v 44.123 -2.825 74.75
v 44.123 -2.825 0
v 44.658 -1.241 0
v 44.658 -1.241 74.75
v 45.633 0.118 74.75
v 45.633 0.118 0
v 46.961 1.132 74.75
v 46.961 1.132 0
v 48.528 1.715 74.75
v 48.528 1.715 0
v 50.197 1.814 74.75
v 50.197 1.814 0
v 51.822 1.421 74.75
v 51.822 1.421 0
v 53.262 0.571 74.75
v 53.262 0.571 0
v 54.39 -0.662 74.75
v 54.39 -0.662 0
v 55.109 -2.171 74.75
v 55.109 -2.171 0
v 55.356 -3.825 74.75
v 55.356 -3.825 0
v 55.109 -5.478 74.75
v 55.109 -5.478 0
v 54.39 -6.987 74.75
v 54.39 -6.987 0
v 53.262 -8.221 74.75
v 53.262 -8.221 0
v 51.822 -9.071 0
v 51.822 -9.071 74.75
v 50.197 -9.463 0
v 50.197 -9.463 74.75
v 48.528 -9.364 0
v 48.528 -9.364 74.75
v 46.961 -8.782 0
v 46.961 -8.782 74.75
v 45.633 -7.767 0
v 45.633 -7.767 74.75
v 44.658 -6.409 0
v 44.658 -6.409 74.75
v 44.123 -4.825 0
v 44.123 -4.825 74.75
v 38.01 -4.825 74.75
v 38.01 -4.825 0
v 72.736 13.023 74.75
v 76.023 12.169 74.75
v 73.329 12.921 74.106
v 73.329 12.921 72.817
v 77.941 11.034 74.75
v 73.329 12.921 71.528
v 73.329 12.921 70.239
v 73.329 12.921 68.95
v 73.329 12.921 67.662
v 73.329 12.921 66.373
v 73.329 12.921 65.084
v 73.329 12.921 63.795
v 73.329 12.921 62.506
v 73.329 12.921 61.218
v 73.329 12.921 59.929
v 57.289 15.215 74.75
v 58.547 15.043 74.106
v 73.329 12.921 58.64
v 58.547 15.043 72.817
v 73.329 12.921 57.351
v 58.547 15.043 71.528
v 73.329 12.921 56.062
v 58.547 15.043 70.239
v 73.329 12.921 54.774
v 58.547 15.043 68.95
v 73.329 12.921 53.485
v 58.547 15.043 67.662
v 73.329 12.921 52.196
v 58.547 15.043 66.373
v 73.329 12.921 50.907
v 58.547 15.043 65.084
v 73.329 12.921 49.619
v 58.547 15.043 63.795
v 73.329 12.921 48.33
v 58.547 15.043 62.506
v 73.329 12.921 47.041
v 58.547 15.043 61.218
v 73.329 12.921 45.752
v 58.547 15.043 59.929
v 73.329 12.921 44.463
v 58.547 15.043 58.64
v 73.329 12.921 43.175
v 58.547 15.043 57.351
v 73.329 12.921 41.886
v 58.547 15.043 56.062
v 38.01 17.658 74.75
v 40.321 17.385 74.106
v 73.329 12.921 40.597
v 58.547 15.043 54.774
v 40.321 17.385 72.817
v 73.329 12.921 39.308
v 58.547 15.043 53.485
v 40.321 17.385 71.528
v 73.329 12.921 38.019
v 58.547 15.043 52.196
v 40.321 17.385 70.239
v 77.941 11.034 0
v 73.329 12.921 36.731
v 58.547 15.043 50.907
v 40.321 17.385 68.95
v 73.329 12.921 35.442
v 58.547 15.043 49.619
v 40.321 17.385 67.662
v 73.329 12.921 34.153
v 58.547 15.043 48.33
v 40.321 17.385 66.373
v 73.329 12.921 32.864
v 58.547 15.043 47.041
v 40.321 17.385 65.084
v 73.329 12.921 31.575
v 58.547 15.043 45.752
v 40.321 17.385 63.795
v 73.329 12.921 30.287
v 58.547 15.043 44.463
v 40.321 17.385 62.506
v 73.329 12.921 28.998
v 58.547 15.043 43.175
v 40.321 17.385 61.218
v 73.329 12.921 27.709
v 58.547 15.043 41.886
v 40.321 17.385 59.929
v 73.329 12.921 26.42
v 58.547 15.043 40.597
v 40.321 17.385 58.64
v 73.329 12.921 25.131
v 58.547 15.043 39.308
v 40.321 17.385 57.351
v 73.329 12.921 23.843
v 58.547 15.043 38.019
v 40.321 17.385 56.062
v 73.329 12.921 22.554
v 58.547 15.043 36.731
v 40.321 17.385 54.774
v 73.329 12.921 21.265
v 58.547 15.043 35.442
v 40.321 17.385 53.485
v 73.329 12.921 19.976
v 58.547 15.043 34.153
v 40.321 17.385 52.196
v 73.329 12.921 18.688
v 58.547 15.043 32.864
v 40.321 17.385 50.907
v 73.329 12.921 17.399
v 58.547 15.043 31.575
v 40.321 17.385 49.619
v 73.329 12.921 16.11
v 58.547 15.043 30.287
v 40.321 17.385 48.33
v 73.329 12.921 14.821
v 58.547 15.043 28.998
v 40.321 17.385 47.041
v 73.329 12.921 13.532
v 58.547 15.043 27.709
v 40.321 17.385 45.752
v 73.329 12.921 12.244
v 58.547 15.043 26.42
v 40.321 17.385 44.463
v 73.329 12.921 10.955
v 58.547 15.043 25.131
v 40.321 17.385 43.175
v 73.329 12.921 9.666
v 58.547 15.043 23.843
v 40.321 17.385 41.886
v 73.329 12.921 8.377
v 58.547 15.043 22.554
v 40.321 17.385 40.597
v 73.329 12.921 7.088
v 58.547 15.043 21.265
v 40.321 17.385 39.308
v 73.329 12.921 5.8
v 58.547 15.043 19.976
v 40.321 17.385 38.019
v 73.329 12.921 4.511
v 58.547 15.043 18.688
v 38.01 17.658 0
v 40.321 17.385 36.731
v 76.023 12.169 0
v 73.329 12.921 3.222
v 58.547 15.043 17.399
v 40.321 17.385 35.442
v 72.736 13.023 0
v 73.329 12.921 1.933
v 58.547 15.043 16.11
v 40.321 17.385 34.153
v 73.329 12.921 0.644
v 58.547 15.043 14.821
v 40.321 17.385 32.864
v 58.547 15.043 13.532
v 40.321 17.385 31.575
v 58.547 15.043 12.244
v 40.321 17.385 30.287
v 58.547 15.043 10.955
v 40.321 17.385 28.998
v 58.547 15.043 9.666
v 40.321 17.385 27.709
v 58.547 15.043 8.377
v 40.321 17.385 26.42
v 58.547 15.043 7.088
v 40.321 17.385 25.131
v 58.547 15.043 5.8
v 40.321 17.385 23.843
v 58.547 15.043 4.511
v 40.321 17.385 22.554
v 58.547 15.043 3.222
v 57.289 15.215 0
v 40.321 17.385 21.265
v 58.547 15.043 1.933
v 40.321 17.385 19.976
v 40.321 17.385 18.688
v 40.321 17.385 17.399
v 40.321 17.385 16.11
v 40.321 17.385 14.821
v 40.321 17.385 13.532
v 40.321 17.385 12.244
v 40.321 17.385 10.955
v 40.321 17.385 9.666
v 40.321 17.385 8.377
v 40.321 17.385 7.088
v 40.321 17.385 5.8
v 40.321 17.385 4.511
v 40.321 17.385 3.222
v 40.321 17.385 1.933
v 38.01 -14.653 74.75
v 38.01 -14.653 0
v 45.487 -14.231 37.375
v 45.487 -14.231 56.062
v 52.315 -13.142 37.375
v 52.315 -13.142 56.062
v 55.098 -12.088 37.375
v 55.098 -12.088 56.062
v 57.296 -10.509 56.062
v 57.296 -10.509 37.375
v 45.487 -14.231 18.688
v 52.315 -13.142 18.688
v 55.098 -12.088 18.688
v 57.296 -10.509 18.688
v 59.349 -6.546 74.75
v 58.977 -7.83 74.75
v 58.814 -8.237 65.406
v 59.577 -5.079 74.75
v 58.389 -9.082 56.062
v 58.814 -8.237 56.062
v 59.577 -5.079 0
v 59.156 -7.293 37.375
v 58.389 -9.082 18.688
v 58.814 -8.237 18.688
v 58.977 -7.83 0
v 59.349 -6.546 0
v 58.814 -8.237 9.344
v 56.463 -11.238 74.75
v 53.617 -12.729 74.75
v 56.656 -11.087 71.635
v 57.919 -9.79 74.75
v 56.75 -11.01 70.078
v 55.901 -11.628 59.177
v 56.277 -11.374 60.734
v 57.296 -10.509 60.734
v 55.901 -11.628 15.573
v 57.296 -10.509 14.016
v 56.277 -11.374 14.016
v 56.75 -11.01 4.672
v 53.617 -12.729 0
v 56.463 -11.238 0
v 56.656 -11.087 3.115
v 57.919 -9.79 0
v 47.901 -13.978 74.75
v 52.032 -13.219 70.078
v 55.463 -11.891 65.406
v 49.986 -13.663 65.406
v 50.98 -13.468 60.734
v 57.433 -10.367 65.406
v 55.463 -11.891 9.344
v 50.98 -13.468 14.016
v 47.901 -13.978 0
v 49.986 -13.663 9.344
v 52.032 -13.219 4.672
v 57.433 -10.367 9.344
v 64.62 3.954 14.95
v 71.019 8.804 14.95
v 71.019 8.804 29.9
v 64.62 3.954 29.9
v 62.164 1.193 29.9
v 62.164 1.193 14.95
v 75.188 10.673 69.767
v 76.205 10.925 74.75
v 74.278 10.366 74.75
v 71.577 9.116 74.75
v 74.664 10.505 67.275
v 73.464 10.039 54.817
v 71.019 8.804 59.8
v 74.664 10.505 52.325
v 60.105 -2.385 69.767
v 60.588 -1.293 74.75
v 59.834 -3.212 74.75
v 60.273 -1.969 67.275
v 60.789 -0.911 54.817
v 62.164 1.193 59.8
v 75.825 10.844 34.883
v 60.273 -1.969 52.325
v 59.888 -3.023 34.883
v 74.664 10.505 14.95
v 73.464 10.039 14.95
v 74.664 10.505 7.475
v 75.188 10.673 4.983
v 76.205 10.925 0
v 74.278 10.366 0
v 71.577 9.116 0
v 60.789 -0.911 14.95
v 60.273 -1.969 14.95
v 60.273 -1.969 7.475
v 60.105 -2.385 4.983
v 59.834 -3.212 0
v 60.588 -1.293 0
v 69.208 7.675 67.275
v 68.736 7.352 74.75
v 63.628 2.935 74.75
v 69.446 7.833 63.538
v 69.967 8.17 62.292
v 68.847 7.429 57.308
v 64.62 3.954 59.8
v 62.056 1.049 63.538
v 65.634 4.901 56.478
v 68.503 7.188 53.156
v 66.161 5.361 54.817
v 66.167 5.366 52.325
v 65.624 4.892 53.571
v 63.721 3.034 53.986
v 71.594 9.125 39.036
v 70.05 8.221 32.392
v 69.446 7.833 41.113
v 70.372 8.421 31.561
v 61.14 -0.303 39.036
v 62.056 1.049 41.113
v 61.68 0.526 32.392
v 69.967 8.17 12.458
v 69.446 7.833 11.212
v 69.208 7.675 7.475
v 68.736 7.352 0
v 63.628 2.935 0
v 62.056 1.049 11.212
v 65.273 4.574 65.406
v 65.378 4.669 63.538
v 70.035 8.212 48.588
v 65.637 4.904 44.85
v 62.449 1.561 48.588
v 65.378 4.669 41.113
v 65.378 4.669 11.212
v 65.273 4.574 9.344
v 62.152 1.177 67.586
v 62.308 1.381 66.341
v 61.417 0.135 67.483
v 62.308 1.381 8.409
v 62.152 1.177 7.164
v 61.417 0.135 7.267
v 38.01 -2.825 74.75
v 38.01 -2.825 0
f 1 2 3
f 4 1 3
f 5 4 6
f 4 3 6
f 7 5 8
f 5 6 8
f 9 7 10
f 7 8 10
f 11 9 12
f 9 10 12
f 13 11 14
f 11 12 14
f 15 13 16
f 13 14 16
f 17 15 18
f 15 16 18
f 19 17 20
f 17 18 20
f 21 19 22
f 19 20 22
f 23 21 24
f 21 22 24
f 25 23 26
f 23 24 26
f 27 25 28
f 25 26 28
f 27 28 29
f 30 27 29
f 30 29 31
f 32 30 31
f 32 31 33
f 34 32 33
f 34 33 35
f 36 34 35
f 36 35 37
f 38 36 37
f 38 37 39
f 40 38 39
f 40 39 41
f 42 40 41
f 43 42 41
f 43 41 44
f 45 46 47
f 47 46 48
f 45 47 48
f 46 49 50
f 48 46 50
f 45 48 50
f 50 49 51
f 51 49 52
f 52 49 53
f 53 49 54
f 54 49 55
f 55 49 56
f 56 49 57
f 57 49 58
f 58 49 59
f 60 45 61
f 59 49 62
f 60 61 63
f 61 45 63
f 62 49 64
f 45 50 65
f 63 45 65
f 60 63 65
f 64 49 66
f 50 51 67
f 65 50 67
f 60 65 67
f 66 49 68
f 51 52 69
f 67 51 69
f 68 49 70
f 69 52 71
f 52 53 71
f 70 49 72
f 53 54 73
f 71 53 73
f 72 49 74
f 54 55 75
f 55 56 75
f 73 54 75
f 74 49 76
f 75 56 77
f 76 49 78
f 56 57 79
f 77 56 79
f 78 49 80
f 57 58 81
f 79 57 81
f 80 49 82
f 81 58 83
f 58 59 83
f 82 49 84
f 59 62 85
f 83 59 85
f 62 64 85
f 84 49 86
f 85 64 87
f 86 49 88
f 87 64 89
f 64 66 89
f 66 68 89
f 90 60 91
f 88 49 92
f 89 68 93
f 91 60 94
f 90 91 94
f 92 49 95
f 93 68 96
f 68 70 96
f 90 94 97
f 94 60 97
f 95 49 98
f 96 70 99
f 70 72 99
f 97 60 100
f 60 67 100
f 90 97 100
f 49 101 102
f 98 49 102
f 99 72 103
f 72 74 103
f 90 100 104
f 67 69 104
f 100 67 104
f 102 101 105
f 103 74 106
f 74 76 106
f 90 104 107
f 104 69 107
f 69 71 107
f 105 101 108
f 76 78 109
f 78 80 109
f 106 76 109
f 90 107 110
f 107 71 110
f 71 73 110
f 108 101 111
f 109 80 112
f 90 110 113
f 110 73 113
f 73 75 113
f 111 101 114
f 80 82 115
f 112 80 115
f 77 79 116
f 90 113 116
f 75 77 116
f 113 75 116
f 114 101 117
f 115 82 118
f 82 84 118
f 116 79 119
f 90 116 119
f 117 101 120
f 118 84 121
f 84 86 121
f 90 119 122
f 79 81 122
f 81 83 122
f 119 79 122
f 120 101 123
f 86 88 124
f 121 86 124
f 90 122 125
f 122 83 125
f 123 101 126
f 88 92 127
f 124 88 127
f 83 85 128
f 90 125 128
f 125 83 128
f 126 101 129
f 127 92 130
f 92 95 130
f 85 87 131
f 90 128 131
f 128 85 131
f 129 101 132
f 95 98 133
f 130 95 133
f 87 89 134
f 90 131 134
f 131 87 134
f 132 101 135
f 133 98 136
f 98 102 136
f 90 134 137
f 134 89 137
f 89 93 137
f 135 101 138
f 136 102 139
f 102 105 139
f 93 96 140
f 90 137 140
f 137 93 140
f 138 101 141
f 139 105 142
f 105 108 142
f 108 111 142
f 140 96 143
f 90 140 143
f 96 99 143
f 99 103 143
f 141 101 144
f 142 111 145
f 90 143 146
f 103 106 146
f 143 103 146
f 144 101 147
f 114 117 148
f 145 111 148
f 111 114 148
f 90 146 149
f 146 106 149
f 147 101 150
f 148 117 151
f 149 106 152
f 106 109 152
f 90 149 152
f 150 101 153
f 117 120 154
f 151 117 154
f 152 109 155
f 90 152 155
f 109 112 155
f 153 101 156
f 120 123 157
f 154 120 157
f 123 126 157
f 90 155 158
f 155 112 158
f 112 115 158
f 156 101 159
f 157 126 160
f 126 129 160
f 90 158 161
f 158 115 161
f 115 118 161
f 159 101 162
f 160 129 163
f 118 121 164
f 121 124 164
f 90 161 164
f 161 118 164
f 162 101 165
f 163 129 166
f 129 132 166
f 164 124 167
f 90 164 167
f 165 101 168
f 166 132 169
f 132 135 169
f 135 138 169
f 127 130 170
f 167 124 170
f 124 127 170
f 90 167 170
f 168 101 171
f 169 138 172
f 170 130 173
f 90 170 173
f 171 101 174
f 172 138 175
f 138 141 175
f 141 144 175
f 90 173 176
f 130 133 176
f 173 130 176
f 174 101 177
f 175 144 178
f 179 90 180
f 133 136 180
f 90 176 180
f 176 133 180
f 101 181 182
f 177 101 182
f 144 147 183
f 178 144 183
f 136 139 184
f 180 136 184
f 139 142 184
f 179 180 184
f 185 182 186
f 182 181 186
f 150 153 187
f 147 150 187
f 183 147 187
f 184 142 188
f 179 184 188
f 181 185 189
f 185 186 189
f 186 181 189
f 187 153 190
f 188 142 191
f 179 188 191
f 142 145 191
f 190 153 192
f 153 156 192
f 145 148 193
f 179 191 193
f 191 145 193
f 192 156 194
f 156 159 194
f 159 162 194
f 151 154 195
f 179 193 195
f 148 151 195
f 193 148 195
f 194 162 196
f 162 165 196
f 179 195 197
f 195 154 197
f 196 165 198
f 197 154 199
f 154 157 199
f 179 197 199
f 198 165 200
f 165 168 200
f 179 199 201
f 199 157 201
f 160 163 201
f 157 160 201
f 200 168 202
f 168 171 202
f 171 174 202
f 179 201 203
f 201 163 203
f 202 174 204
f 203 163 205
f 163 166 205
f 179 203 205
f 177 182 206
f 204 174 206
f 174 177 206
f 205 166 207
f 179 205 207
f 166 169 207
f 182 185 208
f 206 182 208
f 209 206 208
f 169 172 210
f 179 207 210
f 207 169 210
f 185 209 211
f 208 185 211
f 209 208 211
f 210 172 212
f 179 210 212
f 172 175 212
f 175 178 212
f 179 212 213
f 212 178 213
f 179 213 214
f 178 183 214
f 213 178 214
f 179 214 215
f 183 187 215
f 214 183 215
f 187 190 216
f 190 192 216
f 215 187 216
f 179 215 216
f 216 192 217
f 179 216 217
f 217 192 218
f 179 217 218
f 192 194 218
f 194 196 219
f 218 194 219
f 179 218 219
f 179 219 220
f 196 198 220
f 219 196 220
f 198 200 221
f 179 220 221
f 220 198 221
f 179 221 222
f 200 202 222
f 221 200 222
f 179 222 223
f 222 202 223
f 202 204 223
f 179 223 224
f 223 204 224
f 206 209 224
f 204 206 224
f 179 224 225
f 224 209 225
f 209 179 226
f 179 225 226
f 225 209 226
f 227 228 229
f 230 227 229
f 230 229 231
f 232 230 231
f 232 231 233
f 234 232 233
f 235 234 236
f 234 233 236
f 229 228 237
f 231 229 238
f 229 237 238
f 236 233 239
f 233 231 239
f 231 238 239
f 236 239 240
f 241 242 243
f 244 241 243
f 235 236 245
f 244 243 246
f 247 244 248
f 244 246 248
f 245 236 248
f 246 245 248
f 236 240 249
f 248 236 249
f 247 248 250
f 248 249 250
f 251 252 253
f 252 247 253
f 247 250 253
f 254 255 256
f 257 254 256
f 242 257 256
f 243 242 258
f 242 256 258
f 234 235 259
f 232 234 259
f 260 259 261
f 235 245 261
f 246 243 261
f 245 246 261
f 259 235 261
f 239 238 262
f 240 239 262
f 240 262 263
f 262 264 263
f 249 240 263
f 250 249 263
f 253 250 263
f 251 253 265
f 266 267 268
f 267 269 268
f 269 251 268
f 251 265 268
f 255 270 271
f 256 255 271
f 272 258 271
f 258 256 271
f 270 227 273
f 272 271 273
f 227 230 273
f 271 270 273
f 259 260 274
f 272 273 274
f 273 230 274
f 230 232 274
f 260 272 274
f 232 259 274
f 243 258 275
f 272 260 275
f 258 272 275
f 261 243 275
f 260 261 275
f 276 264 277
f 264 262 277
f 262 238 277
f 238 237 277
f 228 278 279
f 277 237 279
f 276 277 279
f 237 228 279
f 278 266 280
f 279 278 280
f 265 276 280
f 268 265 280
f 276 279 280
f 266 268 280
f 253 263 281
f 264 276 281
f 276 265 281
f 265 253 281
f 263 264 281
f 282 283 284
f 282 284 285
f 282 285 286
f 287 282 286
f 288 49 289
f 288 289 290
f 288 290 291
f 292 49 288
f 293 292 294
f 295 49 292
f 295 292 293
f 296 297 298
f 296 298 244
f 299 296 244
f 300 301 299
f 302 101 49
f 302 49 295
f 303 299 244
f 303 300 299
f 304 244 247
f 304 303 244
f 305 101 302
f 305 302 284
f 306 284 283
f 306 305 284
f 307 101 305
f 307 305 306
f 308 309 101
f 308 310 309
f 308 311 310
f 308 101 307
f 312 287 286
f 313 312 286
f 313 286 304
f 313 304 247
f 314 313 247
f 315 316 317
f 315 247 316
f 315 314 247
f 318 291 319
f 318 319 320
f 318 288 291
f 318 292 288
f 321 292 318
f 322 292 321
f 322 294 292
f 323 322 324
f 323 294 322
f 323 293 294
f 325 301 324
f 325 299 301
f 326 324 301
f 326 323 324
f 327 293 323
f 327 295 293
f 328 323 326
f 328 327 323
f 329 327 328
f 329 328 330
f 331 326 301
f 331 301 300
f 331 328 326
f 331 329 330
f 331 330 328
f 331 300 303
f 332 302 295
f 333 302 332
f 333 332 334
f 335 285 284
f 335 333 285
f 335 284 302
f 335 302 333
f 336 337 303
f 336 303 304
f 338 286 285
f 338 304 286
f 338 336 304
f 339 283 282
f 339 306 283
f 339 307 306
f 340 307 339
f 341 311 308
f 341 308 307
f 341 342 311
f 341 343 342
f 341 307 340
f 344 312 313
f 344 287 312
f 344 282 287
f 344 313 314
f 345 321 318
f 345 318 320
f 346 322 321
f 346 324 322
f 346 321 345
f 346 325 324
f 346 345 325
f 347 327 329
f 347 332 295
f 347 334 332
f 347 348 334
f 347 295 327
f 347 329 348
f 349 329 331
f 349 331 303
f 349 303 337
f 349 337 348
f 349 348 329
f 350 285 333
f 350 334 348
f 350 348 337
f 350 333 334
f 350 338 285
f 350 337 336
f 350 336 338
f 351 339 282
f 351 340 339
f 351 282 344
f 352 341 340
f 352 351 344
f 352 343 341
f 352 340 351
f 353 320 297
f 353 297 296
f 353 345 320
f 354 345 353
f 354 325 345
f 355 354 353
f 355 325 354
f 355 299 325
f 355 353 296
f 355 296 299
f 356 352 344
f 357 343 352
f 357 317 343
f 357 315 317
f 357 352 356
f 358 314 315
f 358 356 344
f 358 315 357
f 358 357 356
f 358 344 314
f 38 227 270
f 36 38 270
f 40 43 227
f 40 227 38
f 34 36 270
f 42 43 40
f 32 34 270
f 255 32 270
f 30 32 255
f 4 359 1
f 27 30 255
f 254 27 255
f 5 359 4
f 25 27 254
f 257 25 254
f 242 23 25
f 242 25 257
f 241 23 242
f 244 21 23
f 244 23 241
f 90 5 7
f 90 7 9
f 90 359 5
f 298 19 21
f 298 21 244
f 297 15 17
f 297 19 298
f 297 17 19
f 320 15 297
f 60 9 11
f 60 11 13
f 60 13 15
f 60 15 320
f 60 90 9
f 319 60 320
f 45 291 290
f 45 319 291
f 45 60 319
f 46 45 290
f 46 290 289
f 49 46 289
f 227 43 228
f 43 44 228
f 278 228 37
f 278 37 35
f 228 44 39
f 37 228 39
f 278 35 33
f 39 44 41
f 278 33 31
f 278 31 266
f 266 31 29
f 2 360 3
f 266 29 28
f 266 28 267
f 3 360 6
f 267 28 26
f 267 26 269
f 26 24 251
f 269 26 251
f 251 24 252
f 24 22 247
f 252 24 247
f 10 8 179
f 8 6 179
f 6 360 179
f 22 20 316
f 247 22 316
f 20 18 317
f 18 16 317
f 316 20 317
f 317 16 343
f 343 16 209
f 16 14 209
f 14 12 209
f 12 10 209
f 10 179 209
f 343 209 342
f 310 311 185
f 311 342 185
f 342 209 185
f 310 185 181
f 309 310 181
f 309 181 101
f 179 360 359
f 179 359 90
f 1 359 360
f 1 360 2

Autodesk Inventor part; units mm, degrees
ref_plane "YZ Plane" through (0, 0, 0) normal (1, 0, 0) x (0, 1, 0)
ref_plane "XZ Plane" through (0, 0, 0) normal (0, 1, 0) x (-1, 0, 0)
ref_plane "XY Plane" through (0, 0, 0) normal (0, 0, 1) x (1, 0, 0)
sketch "Sketch3" plane through (0, 0, 0) normal (0, 0, 1) x (1, 0, 0)
  line L0 (-80.5781, 0.8246) -> (-80.5781, 20.7988) construction
  circle A0 centre (-80.5781, 0.8246) radius 13.481
  line L1 (-53.7179, 12.5571) -> (-53.7179, -10.9927)
  arc A1 (-53.7179, -10.9927) -> (-51.5054, -12.9814) centre (-51.7179, -10.9927) ccw
  arc A2 (-51.5054, 14.5458) -> (-53.7179, 12.5571) centre (-51.7179, 12.5571) ccw
  line L2 (36.2229, -3.6088) -> (-51.5054, -12.9814)
  line L3 (38.0104, 3.1845) -> (38.0104, -1.6201)
  line L4 (-80.5781, 0.8246) -> (49.5525, 0.8246) construction
  circle A3 centre (49.6953, -3.8247) radius 5.6609
  line L5 (59.6953, 14.884) -> (59.6953, -12.7998) construction
  spline S0 degree 4 poles (77.9414, 11.0338) (75.5683, 12.9654) (71.7145, 13.0272) (66.8099, 13.9036) (60.7685, 14.7338) (56.2959, 15.3578) (51.7728, 15.9509) (47.2242, 16.5426) (42.6244, 17.1111) (37.9974, 17.6651) (33.3378, 18.1987) (28.6546, 18.7114) (23.9504, 19.2026) (19.2309, 19.6699) (14.5002, 20.1135) (9.7632, 20.5291) (5.025, 20.9191) (0.2903, 21.2792) (-4.4372, 21.6095) (-9.151, 21.9092) (-13.8524, 22.1766) (-18.5268, 22.4102) (-23.2002, 22.6105) (-27.8558, 22.7627) (-32.4748, 22.8704) (-37.0553, 22.9312) (-41.5904, 22.9454) (-46.0738, 22.9127) (-50.5027, 22.8323) (-54.8678, 22.7052) (-59.1755, 22.5324) (-63.394, 22.3084) (-67.5752, 22.0492) (-71.5451, 21.7209) (-75.7777, 21.4072) (-79.04, 20.9063) (-83.4863, 20.5541) (-87.0067, 20.037) (-90.7113, 19.5168) (-94.2172, 18.9459) (-97.6363, 18.3426) (-100.9342, 17.7015) (-104.1216, 17.0263) (-107.1909, 16.3187) (-110.1396, 15.5797) (-112.9656, 14.8117) (-115.6652, 14.0172) (-118.2357, 13.1965) (-120.6759, 12.3541) (-122.9817, 11.4895) (-125.1529, 10.6071) (-127.1857, 9.7065) (-129.0794, 8.7914) (-130.8324, 7.8633) (-132.4429, 6.923) (-133.9096, 5.9737) (-135.2322, 5.016) (-136.4083, 4.0508) (-137.4392, 3.0816) (-138.3215, 2.1025) (-139.0592, 1.1321) (-139.6407, 0.1249) (-140.106, -0.8362) (-140.3589, -2.0477) (-140.602, -2.598) (-140.1166, -5.4607) (-140.0539, -5.4622) (-139.4639, -6.7645) (-138.8842, -7.4979) (-138.1173, -8.3934) (-137.2199, -9.1877) (-136.1721, -9.9852) (-134.9893, -10.738) (-133.6669, -11.4655) (-132.2091, -12.1599) (-130.6156, -12.8245) (-128.8897, -13.4579) (-127.0312, -14.0591) (-125.0439, -14.6296) (-122.9287, -15.1678) (-120.6879, -15.6738) (-118.3241, -16.1476) (-115.8396, -16.5892) (-113.2366, -16.9984) (-110.5176, -17.3742) (-107.6861, -17.7183) (-104.7439, -18.0297) (-101.6943, -18.3095) (-98.5398, -18.5568) (-95.2843, -18.7732) (-91.9297, -18.9579) (-88.48, -19.1131) (-84.9381, -19.2376) (-81.3071, -19.3341) (-77.5906, -19.4015) (-73.7915, -19.4421) (-69.9139, -19.4561) (-65.961, -19.445) (-61.9362, -19.4102) (-57.8434, -19.3518) (-53.6861, -19.2727) (-49.4679, -19.1731) (-45.1932, -19.0538) (-40.8649, -18.9183) (-36.4879, -18.766) (-32.0649, -18.5992) (-27.598, -18.4192) (-23.0941, -18.227) (-18.5434, -18.0273) (-13.9382, -17.8076) (-9.3141, -17.5719) (-4.666, -17.3195) (-0.0002, -17.052) (4.6675, -16.7728) (9.3655, -16.4759) (14.0236, -16.1832) (19.545, -15.7815) (23.3079, -15.6072) (27.1098, -15.1781) (28.8959, -15.0599) knots 0 0 0 0 0 0.024672 0.034555 0.0445 0.054495 0.064543 0.074632 0.084755 0.094911 0.105094 0.115299 0.125521 0.135755 0.145995 0.156237 0.166475 0.176705 0.186921 0.197118 0.207299 0.217463 0.227605 0.23772 0.247796 0.257824 0.267798 0.277713 0.287563 0.297345 0.307053 0.31668 0.326224 0.335555 0.344908 0.354162 0.363308 0.372467 0.381393 0.390196 0.398872 0.407415 0.41582 0.424082 0.432193 0.44015 0.447945 0.455574 0.46303 0.470307 0.477401 0.484305 0.491015 0.497525 0.503831 0.509931 0.515822 0.521506 0.526986 0.53227 0.537373 0.542316 0.547131 0.552525 0.557529 0.562533 0.567581 0.57205 0.576988 0.582082 0.587354 0.592817 0.598478 0.604341 0.610406 0.616671 0.623133 0.629789 0.636632 0.643658 0.650861 0.658236 0.665777 0.673478 0.681333 0.689338 0.697486 0.705771 0.71419 0.722736 0.731403 0.740188 0.749084 0.758087 0.767192 0.776393 0.785687 0.795067 0.804529 0.814069 0.823682 0.833362 0.843106 0.852907 0.862763 0.872667 0.88262 0.892624 0.902675 0.912766 0.92289 0.933033 0.943191 0.953358 0.963531 0.973703 0.984092 1 1 1 1 1
  line L6 (7.5013, -16.4763) -> (50.2906, -13.6435) construction
  arc A4 (44.8353, -17.2546) -> (13.385, -19.3367) centre (31.5327, -54.8885) ccw construction
  line L7 (159.6953, -3.8066) -> (59.6953, -3.8066) construction
  line L8 (-51.5054, 14.5458) -> (36.2229, 5.1732)
  arc A5 (36.2229, -3.6088) -> (38.0104, -1.6201) centre (36.0104, -1.6201) ccw
  arc A6 (38.0104, 3.1845) -> (36.2229, 5.1732) centre (36.0104, 3.1845) ccw
  spline S1 degree 4 poles (78.1029, 11.0141) (76.6463, 11.2227) (73.9909, 10.5042) (70.2765, 8.6041) (66.0429, 5.3938) (62.3889, 1.8499) (60.314, -1.2467) (59.5572, -3.5763) (59.5773, -5.0793) knots 0 0 0 0 0 0.302475 0.43895 0.576633 0.708802 1 1 1 1 1
  spline S2 degree 4 poles (28.8959, -15.0599) (34.0984, -14.7105) (49.269, -14.182) (58.5645, -15.239) (59.5773, -5.0793) knots 0 0 0 0 0 1 1 1 1 1
  line L9 (28.8959, -15.0599) -> (34.0984, -14.7105) construction
  line L10 (34.0984, -14.7105) -> (49.269, -14.182) construction
  line L11 (49.269, -14.182) -> (58.5645, -15.239) construction
  line L12 (58.5645, -15.239) -> (59.5773, -5.0793) construction
  line L13 (-140.4646, -2.8394) -> (159.4818, -3.8173) construction
  line L14 (-132.0856, 0.6333) -> (-132.0856, -6.3667)
  line L15 (-132.0856, -6.3667) -> (-110.3816, -12.3574)
  line L16 (-110.3816, -12.3574) -> (-104.797, -12.3574)
  line L17 (-104.797, -12.3574) -> (-104.797, -18.0156)
  line L18 (-132.0856, 0.6333) -> (-110.3816, 10.553)
  line L19 (-110.3816, 10.553) -> (-104.1736, 10.553)
  line L20 (-104.1736, 10.553) -> (-104.1736, 17.0026)
  line L21 (38.0104, 0.8246) -> (38.0104, -14.6534)
  line L22 (38.0104, 0.8246) -> (38.0104, 17.6585)
  point P0 (0, 0)
  point P1 (17.6589, 23.5628)
  point P2 (75.883, 10.8572)
  point P3 (72.8647, 9.7686)
  point P4 (69.4179, 7.8149)
  point P5 (66.0452, 5.2617)
  point P6 (63.1887, 2.4463)
  point P7 (61.1228, -0.3317)
  point P8 (59.9357, -2.8689)
  point P9 (-160.0931, -3.8671)
  point P10 (28.8959, -15.0599)
  point P11 (69.5533, 13.4647)
  point P12 (65.1899, 14.1023)
  point P13 (60.7936, 14.7318)
  point P14 (56.3207, 15.3468)
  point P15 (51.7945, 15.947)
  point P16 (47.2398, 16.5346)
  point P17 (42.6414, 17.1053)
  point P18 (33.3491, 18.1925)
  point P19 (28.6632, 18.7055)
  point P20 (23.9568, 19.1966)
  point P21 (19.2348, 19.6643)
  point P22 (14.5017, 20.1074)
  point P23 (9.7623, 20.5238)
  point P24 (5.0217, 20.9132)
  point P25 (0.2844, 21.2735)
  point P26 (-4.4451, 21.6038)
  point P27 (-9.1614, 21.9032)
  point P28 (-13.86, 22.1702)
  point P29 (-18.5361, 22.4036)
  point P30 (-23.211, 22.601)
  point P31 (-27.8721, 22.754)
  point P32 (-32.4966, 22.8611)
  point P33 (-37.0797, 22.9217)
  point P34 (-41.6169, 22.9356)
  point P35 (-46.1028, 22.9023)
  point P36 (-50.5329, 22.8216)
  point P37 (-54.9021, 22.6941)
  point P38 (-59.2065, 22.5195)
  point P39 (-63.4406, 22.2977)
  point P40 (-67.6008, 22.0302)
  point P41 (-71.6806, 21.7165)
  point P42 (-75.6814, 21.3591)
  point P43 (-79.1834, 20.9458)
  point P44 (-83.4048, 20.5095)
  point P45 (-87.1309, 20.023)
  point P46 (-90.7527, 19.494)
  point P47 (-94.2725, 18.9266)
  point P48 (-97.6845, 18.3211)
  point P49 (-100.9861, 17.6791)
  point P50 (-107.2438, 16.2934)
  point P51 (-110.1931, 15.553)
  point P52 (-113.0194, 14.7835)
  point P53 (-115.7191, 13.987)
  point P54 (-118.2898, 13.165)
  point P55 (-120.7294, 12.3201)
  point P56 (-123.0349, 11.454)
  point P57 (-125.2048, 10.569)
  point P58 (-127.2364, 9.6666)
  point P59 (-129.1282, 8.7491)
  point P60 (-130.8786, 7.8185)
  point P61 (-132.486, 6.8762)
  point P62 (-133.9488, 5.9245)
  point P63 (-135.2661, 4.9648)
  point P64 (-136.4363, 3.9987)
  point P65 (-137.4592, 3.0275)
  point P66 (-138.3336, 2.0531)
  point P67 (-139.0591, 1.0763)
  point P68 (-139.6352, 0.0983)
  point P69 (-140.0613, -0.8802)
  point P70 (-140.338, -1.8576)
  point P71 (-140.1239, -5.2398)
  point P72 (-139.9547, -5.7022)
  point P73 (-139.492, -6.6066)
  point P74 (-138.8844, -7.4823)
  point P75 (-138.1328, -8.3292)
  point P76 (-137.2384, -9.147)
  point P77 (-136.202, -9.9355)
  point P78 (-135.0249, -10.6943)
  point P79 (-133.7085, -11.4228)
  point P80 (-132.2548, -12.1206)
  point P81 (-130.6648, -12.7879)
  point P82 (-128.941, -13.4239)
  point P83 (-127.0846, -14.0282)
  point P84 (-125.0983, -14.6009)
  point P85 (-122.9839, -15.1415)
  point P86 (-120.7435, -15.6497)
  point P87 (-118.3798, -16.1256)
  point P88 (-115.8952, -16.569)
  point P89 (-113.2918, -16.9797)
  point P90 (-110.5723, -17.3574)
  point P91 (-107.74, -17.7027)
  point P92 (-101.7463, -18.2964)
  point P93 (-98.5909, -18.5451)
  point P94 (-95.3341, -18.7623)
  point P95 (-91.9783, -18.9484)
  point P96 (-88.5271, -19.1041)
  point P97 (-84.9838, -19.2298)
  point P98 (-81.3514, -19.3267)
  point P99 (-77.6332, -19.3951)
  point P100 (-73.8324, -19.4362)
  point P101 (-69.9531, -19.4509)
  point P102 (-65.9985, -19.4404)
  point P103 (-61.9719, -19.4059)
  point P104 (-57.8772, -19.3483)
  point P105 (-53.718, -19.2694)
  point P106 (-49.4979, -19.1701)
  point P107 (-45.2211, -19.0516)
  point P108 (-40.8909, -18.916)
  point P109 (-36.5118, -18.7642)
  point P110 (-32.0871, -18.5977)
  point P111 (-27.6213, -18.418)
  point P112 (-23.1183, -18.2269)
  point P113 (-18.5646, -18.0247)
  point P114 (-13.9566, -17.8054)
  point P115 (-9.3252, -17.5693)
  point P116 (-4.674, -17.317)
  point P117 (-0.0078, -17.05)
  point P118 (4.6686, -16.7695)
  point P119 (9.3513, -16.477)
  point P120 (14.0352, -16.1731)
  point P121 (18.7161, -15.8596)
  point P122 (23.3889, -15.5371)
  point P123 (78.0825, 12.164)
  point P124 (159.2574, -3.8401)
  point P125 (158.8836, -3.8779)
  point P126 (158.3607, -3.9307)
  point P127 (157.6896, -3.9985)
  point P128 (156.8706, -4.081)
  point P129 (155.9046, -4.1779)
  point P130 (154.7931, -4.2892)
  point P131 (153.5367, -4.4143)
  point P132 (152.1372, -4.5532)
  point P133 (150.5955, -4.7056)
  point P134 (148.914, -4.8712)
  point P135 (147.0936, -5.0494)
  point P136 (145.137, -5.2399)
  point P137 (143.0457, -5.4421)
  point P138 (140.8221, -5.6563)
  point P139 (138.4686, -5.8813)
  point P140 (135.9876, -6.1174)
  point P141 (133.3815, -6.3634)
  point P142 (130.6533, -6.6196)
  point P143 (127.8054, -6.8851)
  point P144 (124.8414, -7.1596)
  point P145 (121.7634, -7.4428)
  point P146 (118.5756, -7.7341)
  point P147 (115.2804, -8.0332)
  point P148 (111.8817, -8.3395)
  point P149 (108.3828, -8.6527)
  point P150 (104.787, -8.9722)
  point P151 (101.0985, -9.2974)
  point P152 (97.3206, -9.6283)
  point P153 (93.4572, -9.9643)
  point P154 (89.5122, -10.3048)
  point P155 (85.4898, -10.6492)
  point P156 (81.3936, -10.9969)
  point P157 (77.2284, -11.3479)
  point P158 (72.9975, -11.701)
  point P159 (68.7057, -12.0556)
  point P160 (64.3572, -12.4117)
  point P161 (59.9559, -12.7678)
  point P162 (55.5069, -13.1239)
  point P163 (51.0138, -13.4788)
  point P164 (46.4817, -13.8316)
  point P165 (41.9148, -14.182)
  point P166 (35.7035, -14.3277)
  point P167 (32.6946, -14.8708)
  point P168 (82.2459, 11.5043)
  point P169 (86.3364, 10.8401)
  point P170 (90.3495, 10.1732)
  point P171 (94.2816, 9.5051)
  point P172 (98.1288, 8.837)
  point P173 (101.8872, 8.171)
  point P174 (105.5538, 7.5086)
  point P175 (109.1244, 6.8507)
  point P176 (112.596, 6.1997)
  point P177 (115.9653, 5.5565)
  point P178 (119.2287, 4.9229)
  point P179 (122.3835, 4.3007)
  point P180 (125.4264, 3.6911)
  point P181 (128.3547, 3.0956)
  point P182 (131.1654, 2.5157)
  point P183 (133.8561, 1.9532)
  point P184 (136.4244, 1.4093)
  point P185 (138.8676, 0.8855)
  point P186 (141.1833, 0.383)
  point P187 (143.3697, -0.0964)
  point P188 (145.4247, -0.5518)
  point P189 (147.3462, -0.9817)
  point P190 (149.1327, -1.3852)
  point P191 (150.7821, -1.7608)
  point P192 (152.2935, -2.1073)
  point P193 (153.6651, -2.4241)
  point P194 (154.8954, -2.7103)
  point P195 (155.9838, -2.9647)
  point P196 (156.9291, -3.187)
  point P197 (157.7307, -3.376)
  point P198 (158.3871, -3.5317)
  point P199 (158.8986, -3.6529)
  dimension "d3" = 26.962
  dimension "d6" = 11.3219
  dimension "d7" = 110
  dimension "d8" = 100
  dimension "d9" = 2
  dimension "d11" = 4.6493
  dimension "d25" = 7
  dimension "d26" = 3.5
  dimension "d27" = 8.379
  dimension "d28" = 30.083
  dimension "d29" = 5
  dimension "d30" = 5
  dimension "d31" = 59.8865
extrude "Extrusion3" add sketch "Sketch3" along normal blind 74.75 contours L22 S0 S1 S2 L21 L3
sketch "Sketch4" plane through (0, 0, 74.75) normal (0, 0, 1) x (1, 0, 0)
  circle A0 centre (49.6953, -3.8247) radius 5.6609 projected
  line L0 (44.0343, -3.8247) -> (38.0104, -3.8247) construction
  line L1 (38.0104, 17.6585) -> (38.0104, -14.6534) projected
  line L2 (45.5024, -4.8247) -> (36.5424, -4.8247)
  line L3 (36.5424, -4.8247) -> (36.5424, -2.8247)
  line L4 (36.5424, -2.8247) -> (45.5024, -2.8247)
  line L5 (45.5024, -2.8247) -> (45.5024, -4.8247)
  line L6 (45.5024, -4.8247) -> (36.5424, -2.8247) construction
  line L7 (36.5424, -4.8247) -> (45.5024, -2.8247) construction
  point P0 (0, 0)
  point P1 (41.0224, -3.8247)
  dimension "d34" = 8.96
  dimension "d35" = 2
extrude "Extrusion4" cut sketch "Sketch4" against normal blind 103.75 contours L4 L5 L2 A0 | A0 L2 L1 L4 | L1 L2 L3 L4 picked at (45.0164, -3.9363)
properties part number "4P.01.01.11-TW-v1-WingRibWFlapSingle" material "Polyurethane Foam"
